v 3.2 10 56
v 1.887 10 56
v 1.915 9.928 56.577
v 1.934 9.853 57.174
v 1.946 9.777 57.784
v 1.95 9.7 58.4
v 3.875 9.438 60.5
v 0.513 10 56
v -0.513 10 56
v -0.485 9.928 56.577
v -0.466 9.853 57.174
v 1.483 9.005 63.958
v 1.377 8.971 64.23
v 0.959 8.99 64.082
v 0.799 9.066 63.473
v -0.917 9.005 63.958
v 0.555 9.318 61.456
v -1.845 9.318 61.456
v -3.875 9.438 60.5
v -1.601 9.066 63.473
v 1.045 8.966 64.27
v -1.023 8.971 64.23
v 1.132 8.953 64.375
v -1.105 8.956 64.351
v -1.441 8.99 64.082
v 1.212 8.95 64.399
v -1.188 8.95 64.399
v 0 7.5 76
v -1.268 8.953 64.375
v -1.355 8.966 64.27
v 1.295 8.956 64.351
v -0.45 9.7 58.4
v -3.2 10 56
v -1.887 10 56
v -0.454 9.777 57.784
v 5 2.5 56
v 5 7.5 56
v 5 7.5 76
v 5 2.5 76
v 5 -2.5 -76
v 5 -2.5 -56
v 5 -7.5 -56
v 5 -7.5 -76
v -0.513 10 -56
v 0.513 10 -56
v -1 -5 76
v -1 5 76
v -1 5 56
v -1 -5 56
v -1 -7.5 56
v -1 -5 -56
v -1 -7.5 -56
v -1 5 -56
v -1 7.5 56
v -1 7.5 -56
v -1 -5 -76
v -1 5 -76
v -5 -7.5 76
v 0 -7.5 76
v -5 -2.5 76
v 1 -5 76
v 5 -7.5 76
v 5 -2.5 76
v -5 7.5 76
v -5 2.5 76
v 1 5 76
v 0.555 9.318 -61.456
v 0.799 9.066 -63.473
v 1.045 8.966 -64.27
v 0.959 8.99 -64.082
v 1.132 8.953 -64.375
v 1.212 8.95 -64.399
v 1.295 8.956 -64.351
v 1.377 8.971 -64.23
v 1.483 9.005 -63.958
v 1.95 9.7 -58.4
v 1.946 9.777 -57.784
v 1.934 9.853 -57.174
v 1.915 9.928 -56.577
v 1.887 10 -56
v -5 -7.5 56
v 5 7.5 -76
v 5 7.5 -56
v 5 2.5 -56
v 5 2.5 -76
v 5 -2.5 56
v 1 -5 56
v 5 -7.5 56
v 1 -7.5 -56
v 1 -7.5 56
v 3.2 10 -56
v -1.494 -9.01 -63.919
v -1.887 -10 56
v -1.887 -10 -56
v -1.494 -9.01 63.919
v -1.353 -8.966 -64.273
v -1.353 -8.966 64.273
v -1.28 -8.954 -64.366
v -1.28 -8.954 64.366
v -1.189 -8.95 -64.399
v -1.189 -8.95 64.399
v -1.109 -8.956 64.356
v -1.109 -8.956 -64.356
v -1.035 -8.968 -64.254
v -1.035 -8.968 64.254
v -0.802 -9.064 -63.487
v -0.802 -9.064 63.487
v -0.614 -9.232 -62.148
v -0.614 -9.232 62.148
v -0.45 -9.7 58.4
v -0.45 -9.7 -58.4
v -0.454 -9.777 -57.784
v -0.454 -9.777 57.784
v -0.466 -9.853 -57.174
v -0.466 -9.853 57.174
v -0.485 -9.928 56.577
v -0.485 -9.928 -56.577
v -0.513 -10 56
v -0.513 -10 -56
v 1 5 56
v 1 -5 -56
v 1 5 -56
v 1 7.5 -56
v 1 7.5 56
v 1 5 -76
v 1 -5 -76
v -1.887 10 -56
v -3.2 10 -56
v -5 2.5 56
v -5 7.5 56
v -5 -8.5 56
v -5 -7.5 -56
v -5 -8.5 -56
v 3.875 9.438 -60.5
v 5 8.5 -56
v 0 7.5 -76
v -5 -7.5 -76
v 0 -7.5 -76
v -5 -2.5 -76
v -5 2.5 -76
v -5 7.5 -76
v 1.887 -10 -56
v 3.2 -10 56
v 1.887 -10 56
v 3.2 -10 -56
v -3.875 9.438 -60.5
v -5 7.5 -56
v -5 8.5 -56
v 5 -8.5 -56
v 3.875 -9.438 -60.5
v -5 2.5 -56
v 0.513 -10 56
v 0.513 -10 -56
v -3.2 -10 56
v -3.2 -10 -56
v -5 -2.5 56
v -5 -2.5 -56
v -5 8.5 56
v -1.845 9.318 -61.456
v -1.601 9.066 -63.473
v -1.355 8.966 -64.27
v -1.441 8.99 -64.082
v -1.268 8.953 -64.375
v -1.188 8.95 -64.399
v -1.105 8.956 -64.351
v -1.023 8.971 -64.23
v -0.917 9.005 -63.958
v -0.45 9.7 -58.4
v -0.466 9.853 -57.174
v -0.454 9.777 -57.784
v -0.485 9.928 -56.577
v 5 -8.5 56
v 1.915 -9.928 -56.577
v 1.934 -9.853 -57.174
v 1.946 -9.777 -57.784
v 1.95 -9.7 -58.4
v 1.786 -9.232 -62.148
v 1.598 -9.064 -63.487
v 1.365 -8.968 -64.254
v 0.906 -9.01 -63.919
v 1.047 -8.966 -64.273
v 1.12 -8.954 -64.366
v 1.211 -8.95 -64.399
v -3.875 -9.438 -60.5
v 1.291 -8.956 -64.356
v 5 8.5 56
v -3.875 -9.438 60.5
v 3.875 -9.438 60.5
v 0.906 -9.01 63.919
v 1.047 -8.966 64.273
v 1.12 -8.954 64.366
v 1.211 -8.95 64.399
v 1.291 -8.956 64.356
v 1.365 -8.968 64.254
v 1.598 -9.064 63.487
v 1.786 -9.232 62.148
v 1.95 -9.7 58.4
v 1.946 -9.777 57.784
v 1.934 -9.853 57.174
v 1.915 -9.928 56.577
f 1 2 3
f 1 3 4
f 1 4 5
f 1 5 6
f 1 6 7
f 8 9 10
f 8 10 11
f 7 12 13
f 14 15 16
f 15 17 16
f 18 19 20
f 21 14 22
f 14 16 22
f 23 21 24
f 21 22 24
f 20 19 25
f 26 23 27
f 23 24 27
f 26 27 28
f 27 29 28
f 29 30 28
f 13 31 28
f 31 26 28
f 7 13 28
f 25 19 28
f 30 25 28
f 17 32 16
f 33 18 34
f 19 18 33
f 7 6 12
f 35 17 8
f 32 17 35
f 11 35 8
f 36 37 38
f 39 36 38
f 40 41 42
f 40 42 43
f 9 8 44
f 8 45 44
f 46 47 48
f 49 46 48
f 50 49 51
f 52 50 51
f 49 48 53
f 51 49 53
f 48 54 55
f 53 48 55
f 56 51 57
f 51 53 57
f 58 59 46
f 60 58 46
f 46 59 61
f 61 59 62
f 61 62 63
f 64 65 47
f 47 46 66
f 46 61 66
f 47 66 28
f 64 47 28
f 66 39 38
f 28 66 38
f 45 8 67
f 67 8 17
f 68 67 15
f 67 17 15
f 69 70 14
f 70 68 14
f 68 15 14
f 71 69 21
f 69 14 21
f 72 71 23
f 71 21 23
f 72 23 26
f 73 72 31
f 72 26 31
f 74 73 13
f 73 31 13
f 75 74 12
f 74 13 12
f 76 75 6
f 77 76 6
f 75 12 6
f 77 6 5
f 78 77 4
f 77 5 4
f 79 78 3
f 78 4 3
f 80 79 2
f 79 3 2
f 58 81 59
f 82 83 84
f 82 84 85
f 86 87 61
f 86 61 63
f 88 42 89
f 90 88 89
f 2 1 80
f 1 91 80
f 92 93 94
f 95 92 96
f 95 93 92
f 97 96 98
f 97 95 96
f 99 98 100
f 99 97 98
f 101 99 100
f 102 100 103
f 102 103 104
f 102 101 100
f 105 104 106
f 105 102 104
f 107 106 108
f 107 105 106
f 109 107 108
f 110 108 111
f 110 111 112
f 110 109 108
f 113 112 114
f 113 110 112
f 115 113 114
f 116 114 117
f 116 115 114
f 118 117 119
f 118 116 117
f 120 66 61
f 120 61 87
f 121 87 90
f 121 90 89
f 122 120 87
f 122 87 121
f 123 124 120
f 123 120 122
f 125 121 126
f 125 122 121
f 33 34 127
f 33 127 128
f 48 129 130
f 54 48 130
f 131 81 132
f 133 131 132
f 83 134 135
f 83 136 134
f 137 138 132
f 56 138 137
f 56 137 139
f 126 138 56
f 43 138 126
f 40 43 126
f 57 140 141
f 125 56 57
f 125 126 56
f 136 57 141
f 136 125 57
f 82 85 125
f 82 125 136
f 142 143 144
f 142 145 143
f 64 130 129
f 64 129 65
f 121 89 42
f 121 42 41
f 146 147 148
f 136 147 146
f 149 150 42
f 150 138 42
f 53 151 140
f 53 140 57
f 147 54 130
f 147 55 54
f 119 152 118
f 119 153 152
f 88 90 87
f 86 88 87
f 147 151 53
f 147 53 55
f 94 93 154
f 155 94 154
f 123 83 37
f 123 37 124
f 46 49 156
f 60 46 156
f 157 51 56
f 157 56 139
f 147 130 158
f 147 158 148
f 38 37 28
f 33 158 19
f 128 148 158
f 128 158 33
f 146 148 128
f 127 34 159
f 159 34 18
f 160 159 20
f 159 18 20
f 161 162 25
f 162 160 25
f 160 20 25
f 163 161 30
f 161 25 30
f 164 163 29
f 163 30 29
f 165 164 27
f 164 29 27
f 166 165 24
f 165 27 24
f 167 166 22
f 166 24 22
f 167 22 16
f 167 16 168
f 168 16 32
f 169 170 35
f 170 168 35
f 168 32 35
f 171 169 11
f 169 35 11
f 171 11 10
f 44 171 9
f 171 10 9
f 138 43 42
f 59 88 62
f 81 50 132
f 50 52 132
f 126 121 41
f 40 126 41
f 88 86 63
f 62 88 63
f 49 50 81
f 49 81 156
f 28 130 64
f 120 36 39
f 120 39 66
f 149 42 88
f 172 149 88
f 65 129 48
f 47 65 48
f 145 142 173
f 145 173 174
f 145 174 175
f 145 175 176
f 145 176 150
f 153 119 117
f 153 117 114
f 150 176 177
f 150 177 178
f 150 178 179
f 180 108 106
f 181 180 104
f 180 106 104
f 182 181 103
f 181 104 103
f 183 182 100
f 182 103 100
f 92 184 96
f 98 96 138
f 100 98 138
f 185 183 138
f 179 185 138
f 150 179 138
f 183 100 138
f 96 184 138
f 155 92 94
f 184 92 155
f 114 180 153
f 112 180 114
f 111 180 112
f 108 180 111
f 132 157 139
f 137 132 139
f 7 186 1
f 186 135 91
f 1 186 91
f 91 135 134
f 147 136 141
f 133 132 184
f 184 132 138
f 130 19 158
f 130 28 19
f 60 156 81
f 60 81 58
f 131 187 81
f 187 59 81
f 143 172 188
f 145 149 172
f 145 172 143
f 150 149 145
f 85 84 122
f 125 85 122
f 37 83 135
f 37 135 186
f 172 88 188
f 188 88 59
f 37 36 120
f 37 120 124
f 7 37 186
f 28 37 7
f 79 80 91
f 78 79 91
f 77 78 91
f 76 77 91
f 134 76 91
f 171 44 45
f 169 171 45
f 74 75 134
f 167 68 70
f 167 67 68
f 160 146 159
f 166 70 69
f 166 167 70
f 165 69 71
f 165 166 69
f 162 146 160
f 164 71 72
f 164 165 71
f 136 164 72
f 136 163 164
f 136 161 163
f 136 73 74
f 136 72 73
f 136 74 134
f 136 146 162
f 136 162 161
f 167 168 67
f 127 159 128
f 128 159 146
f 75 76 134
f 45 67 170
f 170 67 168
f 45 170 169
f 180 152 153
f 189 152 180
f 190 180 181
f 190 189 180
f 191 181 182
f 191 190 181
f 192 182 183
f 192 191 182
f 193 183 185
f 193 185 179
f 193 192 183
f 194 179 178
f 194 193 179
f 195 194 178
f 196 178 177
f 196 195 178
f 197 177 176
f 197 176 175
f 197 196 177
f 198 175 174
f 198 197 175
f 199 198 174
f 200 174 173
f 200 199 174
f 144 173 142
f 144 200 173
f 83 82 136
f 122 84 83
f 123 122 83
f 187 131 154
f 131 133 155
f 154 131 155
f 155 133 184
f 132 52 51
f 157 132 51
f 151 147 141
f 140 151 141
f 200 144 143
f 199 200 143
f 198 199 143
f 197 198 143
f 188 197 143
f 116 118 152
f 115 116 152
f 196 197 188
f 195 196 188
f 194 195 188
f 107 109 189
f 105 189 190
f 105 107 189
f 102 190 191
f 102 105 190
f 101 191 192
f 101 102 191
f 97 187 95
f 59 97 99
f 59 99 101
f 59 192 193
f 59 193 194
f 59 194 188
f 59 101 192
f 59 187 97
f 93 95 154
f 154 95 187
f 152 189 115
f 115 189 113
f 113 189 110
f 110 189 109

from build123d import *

# Parameters (mm, degrees)
SKETCH1_W               = 152
SKETCH1_H               = 15
BOSS_EXTRUDE1_DEPTH     = 1
SKETCH2_W               = 20
SKETCH2_H               = 15
BOSS_EXTRUDE2_DEPTH     = 4
CUT_EXTRUDE1_DEPTH      = 133.3074072
MIRROR2_COPY_1_SKETCH_W = 20
MIRROR2_COPY_1_SKETCH_H = 15
MIRROR2_COPY_1_DEPTH    = 4
MIRROR2_COPY_2_DEPTH    = 133.3074072
BOSS_EXTRUDE5_DEPTH     = 2.5
CUT_EXTRUDE2_DEPTH      = 78.30459236
SKETCH9_R               = 0.75
CUT_EXTRUDE3_DEPTH      = 153.410629551
CUT_EXTRUDE4_DEPTH      = 153.410629551


with BuildPart() as part:
    # Sketch1 → Boss-Extrude1 (new, symmetric)
    with BuildSketch(Plane(origin=(0, 0, 0), x_dir=(0, 0, -1), z_dir=(1, 0, 0))):
        Rectangle(SKETCH1_W, SKETCH1_H)
    extrude(amount=BOSS_EXTRUDE1_DEPTH, both=True)

    # Sketch2 → Boss-Extrude2 (add)
    with BuildSketch(Plane(origin=(1, 0, 0), x_dir=(0, 0, -1), z_dir=(1, 0, 0))):
        with Locations((66, 0)):
            Rectangle(SKETCH2_W, SKETCH2_H)
    boss_extrude2 = extrude(amount=BOSS_EXTRUDE2_DEPTH)

    # Sketch3 → Cut-Extrude1 (cut, through all)
    with BuildSketch(Plane.XY.offset(-56)):
        Polygon((5, 2.5), (1, 5), (1, -5), (5, -2.5), align=None)
    cut_extrude1 = extrude(amount=-CUT_EXTRUDE1_DEPTH, mode=Mode.SUBTRACT)

    # Mirror1: Boss-Extrude2, Cut-Extrude1 across plane
    add(boss_extrude2.mirror(Plane(origin=(0, 0, 0), x_dir=(0, 0, 1), z_dir=(1, 0, 0))))
    add(cut_extrude1.mirror(Plane(origin=(0, 0, 0), x_dir=(0, 0, 1), z_dir=(1, 0, 0))), mode=Mode.SUBTRACT)

    # Mirror2: Boss-Extrude2, Cut-Extrude1 across plane
    add(boss_extrude2.mirror(Plane.XY))
    add(cut_extrude1.mirror(Plane.XY), mode=Mode.SUBTRACT)

    # Mirror2 copy 1 sketch → Mirror2 copy 1 (add)
    with BuildSketch(Plane.ZY.offset(1)):
        with Locations((66, 0)):
            Rectangle(MIRROR2_COPY_1_SKETCH_W, MIRROR2_COPY_1_SKETCH_H)
    extrude(amount=MIRROR2_COPY_1_DEPTH)

    # Mirror2 copy 2 sketch → Mirror2 copy 2 (cut, through all)
    with BuildSketch(Plane(origin=(0, 0, 56), x_dir=(-1, 0, 0), z_dir=(0, 0, -1))):
        Polygon((5, 2.5), (1, 5), (1, -5), (5, -2.5), align=None)
    extrude(amount=-MIRROR2_COPY_2_DEPTH, mode=Mode.SUBTRACT)

    # Sketch7 → Boss-Extrude5 (add)
    with BuildSketch(Plane(origin=(0, 7.5, 0), x_dir=(1, 0, 0), z_dir=(0, 1, 0))):
        Polygon((0, -76), (-5, -56), (-5, 56), (0, 76), (5, 56), (5, -56), align=None)
    boss_extrude5 = extrude(amount=BOSS_EXTRUDE5_DEPTH)

    # Sketch8 → Cut-Extrude2 (cut, through all)
    with BuildSketch(Plane.ZY.offset(5)):
        Polygon((-56, 10), (-76, 7.5), (-76, 10), align=None)
        Polygon((76, 10), (56, 10), (76, 7.5), align=None)
    cut_extrude2 = extrude(amount=-CUT_EXTRUDE2_DEPTH, mode=Mode.SUBTRACT)

    # Sketch9 → Cut-Extrude3 (cut, through all)
    with BuildSketch(Plane.XY.offset(76)):
        with Locations((1.2, 9.7)):
            Circle(SKETCH9_R)
        with Locations((-1.2, 9.7)):
            Circle(SKETCH9_R)
    cut_extrude3 = extrude(amount=-CUT_EXTRUDE3_DEPTH, mode=Mode.SUBTRACT)

    # Mirror4: Boss-Extrude5, Cut-Extrude2, Cut-Extrude3 across plane
    add(boss_extrude5.mirror(Plane.ZX))
    add(cut_extrude2.mirror(Plane.ZX), mode=Mode.SUBTRACT)
    add(cut_extrude3.mirror(Plane.ZX), mode=Mode.SUBTRACT)

    # Sketch10 → Cut-Extrude4 (cut, through all)
    with BuildSketch(Plane(origin=(0, 0, -76), x_dir=(-1, 0, 0), z_dir=(0, 0, -1))):
        Polygon((-5, 8.5), (-3.2, 10), (-5, 10), align=None)
        Polygon((5, 10), (5, 8.5), (3.2, 10), align=None)
        Polygon((-5, -10), (-5, -8.5), (-3.2, -10), align=None)
        Polygon((5, -8.5), (3.2, -10), (5, -10), align=None)
    extrude(amount=-CUT_EXTRUDE4_DEPTH, mode=Mode.SUBTRACT)


solid = part.part
